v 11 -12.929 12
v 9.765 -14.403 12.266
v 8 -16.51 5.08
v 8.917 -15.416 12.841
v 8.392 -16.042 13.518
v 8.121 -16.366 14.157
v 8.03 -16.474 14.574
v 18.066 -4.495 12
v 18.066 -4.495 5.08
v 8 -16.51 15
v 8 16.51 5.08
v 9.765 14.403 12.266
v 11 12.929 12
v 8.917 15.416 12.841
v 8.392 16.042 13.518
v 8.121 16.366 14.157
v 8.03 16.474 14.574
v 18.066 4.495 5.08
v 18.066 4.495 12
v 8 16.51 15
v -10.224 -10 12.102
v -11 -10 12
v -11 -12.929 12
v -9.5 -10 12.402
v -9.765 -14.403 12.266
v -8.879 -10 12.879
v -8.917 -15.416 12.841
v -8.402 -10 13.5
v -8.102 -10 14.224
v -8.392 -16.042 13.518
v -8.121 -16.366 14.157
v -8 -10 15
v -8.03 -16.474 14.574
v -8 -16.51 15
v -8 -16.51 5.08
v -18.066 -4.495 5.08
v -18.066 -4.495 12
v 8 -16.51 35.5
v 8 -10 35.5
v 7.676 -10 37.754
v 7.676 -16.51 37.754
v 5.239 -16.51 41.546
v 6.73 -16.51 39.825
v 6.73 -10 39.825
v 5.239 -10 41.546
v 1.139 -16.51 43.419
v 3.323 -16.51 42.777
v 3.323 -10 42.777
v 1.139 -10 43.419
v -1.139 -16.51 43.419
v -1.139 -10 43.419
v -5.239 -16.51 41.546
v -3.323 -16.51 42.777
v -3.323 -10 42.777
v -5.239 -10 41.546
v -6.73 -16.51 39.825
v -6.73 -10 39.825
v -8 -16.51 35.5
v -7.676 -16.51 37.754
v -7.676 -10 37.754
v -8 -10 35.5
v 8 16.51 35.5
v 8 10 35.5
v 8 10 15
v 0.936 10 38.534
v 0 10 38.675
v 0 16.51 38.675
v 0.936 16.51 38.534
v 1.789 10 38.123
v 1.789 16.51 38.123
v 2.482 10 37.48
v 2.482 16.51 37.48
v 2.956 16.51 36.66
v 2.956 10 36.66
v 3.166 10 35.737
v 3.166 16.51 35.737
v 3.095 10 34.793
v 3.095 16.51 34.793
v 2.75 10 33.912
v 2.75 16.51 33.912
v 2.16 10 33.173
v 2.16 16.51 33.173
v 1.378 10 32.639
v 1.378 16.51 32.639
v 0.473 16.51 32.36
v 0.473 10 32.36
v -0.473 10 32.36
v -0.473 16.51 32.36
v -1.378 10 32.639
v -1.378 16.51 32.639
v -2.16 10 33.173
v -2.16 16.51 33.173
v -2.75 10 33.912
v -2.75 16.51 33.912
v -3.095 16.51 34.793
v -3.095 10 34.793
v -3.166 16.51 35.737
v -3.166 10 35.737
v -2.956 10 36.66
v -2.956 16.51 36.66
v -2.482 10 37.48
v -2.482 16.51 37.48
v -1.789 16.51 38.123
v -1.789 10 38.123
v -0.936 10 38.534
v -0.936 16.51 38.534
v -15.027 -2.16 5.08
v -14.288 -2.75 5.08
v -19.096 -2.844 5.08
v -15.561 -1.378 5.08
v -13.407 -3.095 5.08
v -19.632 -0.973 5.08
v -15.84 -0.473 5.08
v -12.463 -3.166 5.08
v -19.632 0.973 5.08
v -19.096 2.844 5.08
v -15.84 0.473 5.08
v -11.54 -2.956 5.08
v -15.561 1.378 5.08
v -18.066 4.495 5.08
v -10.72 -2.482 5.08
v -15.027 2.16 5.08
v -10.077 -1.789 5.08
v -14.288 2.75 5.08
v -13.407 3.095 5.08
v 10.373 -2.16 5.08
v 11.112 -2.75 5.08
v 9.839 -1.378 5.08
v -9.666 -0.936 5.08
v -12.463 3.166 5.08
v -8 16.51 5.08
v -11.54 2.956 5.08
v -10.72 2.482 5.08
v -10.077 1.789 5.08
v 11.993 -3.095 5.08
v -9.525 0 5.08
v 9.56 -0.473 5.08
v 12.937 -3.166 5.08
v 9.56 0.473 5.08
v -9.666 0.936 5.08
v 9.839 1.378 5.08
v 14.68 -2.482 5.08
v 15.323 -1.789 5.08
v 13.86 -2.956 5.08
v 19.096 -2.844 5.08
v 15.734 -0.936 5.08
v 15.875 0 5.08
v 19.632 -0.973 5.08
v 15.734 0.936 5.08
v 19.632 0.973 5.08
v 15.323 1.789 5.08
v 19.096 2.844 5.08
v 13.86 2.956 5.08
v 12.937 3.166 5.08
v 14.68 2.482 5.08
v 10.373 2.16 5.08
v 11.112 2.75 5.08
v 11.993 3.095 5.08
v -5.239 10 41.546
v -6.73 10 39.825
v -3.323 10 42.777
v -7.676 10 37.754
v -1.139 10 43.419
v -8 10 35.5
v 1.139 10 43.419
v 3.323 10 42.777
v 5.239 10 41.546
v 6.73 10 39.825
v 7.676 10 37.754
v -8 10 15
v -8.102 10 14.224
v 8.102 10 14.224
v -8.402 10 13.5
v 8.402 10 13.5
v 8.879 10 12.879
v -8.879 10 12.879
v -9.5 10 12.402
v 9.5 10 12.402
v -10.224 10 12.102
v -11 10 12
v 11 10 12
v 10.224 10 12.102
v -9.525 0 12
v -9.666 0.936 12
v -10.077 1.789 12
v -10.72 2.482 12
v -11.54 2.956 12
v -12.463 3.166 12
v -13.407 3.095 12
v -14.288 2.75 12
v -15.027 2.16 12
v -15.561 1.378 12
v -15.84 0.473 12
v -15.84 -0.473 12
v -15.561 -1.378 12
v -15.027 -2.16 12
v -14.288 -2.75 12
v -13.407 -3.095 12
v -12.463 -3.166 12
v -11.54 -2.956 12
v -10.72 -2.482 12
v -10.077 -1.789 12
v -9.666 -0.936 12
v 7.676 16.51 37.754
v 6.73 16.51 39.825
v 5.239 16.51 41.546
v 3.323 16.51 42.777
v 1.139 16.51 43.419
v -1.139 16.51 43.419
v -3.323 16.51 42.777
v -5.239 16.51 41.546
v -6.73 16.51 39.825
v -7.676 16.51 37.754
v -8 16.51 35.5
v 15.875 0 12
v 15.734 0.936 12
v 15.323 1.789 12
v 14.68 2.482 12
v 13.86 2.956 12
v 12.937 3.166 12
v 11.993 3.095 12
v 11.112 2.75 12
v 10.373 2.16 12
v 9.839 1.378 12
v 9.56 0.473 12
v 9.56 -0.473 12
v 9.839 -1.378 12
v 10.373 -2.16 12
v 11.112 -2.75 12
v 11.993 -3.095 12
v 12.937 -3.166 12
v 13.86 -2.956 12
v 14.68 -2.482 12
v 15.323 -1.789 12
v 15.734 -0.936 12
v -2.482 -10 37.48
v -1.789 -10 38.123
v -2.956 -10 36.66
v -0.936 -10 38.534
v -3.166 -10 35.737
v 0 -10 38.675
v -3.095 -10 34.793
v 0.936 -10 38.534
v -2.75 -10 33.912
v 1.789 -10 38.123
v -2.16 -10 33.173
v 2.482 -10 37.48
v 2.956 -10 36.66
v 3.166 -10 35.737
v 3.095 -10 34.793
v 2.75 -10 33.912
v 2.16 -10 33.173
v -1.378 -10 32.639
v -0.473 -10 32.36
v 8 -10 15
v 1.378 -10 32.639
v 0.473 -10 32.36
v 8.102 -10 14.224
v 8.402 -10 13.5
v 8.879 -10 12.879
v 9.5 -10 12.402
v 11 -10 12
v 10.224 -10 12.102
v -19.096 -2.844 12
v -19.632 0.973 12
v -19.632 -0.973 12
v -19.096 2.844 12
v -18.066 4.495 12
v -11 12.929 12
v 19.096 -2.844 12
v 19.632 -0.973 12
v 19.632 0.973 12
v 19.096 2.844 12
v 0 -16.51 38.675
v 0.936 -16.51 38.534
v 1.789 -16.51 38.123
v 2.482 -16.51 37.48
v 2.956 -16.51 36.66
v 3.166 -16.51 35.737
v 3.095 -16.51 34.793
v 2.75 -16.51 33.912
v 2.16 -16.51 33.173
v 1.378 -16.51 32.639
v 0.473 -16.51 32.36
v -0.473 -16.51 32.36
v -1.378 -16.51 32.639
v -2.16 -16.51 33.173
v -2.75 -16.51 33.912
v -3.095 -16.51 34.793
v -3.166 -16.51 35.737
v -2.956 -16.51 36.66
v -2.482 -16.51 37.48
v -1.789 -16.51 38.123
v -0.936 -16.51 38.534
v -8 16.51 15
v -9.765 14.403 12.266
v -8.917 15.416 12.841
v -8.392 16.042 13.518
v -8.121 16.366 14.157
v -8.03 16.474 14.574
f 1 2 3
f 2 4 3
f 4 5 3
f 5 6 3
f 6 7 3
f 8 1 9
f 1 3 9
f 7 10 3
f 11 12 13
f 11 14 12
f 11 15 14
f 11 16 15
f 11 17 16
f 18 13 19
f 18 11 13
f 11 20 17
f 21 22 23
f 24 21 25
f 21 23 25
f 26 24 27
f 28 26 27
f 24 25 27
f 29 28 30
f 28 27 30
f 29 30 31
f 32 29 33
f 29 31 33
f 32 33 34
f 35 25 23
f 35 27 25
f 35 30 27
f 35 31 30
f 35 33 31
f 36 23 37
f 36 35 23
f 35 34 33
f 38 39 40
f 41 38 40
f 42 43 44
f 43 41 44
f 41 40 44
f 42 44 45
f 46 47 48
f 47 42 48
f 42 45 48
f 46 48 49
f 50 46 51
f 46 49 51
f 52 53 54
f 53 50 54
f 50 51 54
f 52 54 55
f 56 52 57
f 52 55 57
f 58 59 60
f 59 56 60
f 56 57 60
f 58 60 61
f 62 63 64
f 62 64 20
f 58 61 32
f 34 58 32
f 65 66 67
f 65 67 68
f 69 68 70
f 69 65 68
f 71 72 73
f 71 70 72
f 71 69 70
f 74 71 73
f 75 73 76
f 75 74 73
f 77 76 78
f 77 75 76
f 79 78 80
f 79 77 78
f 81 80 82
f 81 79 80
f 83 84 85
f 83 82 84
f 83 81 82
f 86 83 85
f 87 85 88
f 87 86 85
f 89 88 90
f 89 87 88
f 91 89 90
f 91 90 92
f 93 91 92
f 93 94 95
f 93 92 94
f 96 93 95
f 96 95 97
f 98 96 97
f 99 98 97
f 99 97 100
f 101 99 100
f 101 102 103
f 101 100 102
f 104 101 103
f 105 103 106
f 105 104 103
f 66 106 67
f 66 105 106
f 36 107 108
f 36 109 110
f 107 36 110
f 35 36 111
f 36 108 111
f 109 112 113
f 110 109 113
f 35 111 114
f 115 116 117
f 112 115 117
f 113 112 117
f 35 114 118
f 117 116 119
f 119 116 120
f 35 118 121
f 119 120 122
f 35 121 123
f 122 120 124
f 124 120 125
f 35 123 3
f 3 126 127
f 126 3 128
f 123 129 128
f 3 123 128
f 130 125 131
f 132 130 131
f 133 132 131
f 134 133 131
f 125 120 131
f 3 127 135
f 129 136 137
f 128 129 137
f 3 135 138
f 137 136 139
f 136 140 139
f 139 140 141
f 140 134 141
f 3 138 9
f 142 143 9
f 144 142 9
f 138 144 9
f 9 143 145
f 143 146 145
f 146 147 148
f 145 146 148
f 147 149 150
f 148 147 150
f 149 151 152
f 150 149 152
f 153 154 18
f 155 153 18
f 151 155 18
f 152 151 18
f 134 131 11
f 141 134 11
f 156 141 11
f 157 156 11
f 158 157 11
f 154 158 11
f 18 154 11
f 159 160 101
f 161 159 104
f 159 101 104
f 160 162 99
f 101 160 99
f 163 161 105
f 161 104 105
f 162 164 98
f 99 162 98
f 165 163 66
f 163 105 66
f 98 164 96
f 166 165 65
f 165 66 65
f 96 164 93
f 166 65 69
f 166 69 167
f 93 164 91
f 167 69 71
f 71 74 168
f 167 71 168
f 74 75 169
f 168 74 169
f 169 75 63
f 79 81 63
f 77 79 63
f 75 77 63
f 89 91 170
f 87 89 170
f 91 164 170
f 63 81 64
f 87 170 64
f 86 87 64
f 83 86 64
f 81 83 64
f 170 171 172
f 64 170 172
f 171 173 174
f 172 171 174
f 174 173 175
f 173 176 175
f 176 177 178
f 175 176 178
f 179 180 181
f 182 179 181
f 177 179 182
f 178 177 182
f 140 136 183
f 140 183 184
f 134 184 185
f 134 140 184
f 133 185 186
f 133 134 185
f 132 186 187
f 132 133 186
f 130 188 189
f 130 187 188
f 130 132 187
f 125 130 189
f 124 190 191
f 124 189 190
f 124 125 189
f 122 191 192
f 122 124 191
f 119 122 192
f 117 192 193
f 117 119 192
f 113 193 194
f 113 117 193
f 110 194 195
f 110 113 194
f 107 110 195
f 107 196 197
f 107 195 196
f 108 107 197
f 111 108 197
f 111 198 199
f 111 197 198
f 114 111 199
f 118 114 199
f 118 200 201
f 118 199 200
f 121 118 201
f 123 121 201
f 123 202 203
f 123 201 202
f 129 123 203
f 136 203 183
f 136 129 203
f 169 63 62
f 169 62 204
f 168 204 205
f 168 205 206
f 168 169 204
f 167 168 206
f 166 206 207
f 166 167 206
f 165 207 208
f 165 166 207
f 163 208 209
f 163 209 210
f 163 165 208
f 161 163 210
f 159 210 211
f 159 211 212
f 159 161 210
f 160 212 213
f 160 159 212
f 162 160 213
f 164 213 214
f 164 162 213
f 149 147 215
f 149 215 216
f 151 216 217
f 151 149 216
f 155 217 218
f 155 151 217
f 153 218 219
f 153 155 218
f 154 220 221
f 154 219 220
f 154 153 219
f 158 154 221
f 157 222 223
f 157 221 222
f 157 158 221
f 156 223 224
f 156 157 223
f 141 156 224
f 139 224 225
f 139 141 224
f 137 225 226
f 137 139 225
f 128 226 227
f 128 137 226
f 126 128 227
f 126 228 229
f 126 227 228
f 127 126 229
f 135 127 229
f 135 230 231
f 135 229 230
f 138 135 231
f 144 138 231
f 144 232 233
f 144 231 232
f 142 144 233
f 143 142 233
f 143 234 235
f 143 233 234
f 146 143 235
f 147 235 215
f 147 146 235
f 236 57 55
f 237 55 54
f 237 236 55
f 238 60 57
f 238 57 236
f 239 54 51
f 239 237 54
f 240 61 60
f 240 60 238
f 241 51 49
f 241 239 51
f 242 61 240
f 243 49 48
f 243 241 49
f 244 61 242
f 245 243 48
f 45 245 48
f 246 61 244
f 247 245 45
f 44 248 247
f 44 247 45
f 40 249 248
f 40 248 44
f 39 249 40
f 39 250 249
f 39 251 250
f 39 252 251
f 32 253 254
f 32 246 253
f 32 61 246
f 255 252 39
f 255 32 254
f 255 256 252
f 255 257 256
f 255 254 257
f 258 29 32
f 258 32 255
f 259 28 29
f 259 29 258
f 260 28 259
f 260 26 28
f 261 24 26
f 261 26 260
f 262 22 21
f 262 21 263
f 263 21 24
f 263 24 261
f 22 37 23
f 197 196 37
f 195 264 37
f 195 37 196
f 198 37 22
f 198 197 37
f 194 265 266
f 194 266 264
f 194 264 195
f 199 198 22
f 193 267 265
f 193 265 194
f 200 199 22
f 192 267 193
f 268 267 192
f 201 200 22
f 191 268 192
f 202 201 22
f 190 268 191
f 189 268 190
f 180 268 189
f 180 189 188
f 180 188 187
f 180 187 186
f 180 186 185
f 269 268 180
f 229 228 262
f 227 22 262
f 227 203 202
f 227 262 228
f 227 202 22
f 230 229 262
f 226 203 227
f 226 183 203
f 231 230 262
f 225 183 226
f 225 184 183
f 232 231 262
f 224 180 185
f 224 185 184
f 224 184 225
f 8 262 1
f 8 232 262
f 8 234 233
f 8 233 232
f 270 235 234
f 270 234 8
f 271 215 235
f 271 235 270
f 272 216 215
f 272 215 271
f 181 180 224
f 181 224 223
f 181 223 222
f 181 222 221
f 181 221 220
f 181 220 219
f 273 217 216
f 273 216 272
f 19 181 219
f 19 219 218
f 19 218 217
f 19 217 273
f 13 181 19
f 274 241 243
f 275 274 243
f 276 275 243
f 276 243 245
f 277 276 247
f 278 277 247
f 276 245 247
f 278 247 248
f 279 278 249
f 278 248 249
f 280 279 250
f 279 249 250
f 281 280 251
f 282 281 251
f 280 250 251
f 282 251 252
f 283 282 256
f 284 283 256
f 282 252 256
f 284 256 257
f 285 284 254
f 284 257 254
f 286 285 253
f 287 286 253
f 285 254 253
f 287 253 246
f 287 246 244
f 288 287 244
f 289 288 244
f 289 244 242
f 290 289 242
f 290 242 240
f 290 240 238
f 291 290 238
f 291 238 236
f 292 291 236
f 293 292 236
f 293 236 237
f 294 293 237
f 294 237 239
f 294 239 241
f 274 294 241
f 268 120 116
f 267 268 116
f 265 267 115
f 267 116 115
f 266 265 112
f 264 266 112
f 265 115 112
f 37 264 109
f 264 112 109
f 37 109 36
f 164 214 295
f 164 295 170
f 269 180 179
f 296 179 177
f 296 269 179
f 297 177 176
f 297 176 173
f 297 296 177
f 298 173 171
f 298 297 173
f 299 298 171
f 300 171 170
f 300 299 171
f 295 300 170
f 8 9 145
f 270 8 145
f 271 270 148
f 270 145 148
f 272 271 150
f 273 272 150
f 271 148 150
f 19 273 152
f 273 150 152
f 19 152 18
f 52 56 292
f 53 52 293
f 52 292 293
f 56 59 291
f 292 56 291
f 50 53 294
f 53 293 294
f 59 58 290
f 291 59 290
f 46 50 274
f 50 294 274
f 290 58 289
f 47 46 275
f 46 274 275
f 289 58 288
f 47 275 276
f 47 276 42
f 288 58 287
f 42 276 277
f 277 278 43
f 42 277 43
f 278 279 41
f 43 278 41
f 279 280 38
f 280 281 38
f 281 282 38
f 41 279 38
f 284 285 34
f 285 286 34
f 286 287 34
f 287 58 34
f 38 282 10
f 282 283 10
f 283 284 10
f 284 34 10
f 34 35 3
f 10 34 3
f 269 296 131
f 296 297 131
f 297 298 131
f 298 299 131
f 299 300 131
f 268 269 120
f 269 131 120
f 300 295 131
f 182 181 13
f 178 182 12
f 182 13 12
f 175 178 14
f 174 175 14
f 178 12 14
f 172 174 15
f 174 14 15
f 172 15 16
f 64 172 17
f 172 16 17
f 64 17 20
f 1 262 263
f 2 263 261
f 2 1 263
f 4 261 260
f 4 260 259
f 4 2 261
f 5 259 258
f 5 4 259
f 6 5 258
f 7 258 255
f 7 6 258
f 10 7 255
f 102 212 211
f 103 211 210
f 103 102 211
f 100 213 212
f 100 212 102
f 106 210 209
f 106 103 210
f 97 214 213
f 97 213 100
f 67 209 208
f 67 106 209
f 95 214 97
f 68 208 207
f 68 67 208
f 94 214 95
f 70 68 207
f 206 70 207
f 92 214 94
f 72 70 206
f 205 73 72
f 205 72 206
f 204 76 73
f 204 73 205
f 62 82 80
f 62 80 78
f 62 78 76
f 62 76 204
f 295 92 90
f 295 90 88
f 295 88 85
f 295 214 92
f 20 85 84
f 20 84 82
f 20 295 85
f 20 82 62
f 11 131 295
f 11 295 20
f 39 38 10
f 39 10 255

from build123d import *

# Parameters (mm, degrees)
SKETCH1_W                      = 41.4
SKETCH1_H                      = 33.02
SKETCH1_R                      = 3.175
BOSS_EXTRUDE1_DEPTH            = 12
SKETCH2_W                      = 41.4
SKETCH2_H                      = 6.51
BOSS_EXTRUDE2_DEPTH            = 53
CUT_EXTRUDE1_REACH             = 72.186
SKETCH4_R                      = 3.175
CUT_EXTRUDE1_DIRECTION_2_REACH = 72.186
CUT_EXTRUDE3_REACH             = 72.186
CUT_EXTRUDE3_DIRECTION_2_REACH = 72.186
CUT_EXTRUDE4_DEPTH             = 12
BOSS_EXTRUDE3_DEPTH            = 12
FILLET3_R                      = 3
CUT_EXTRUDE5_DEPTH             = 5.08


with BuildPart() as part:
    # Sketch1 → Boss-Extrude1 (new body)
    with BuildSketch(Plane.XY):
        Rectangle(SKETCH1_W, SKETCH1_H)
        with Locations((12.7, 0)):
            Circle(SKETCH1_R, mode=Mode.SUBTRACT)
        with Locations((-12.7, 0)):
            Circle(SKETCH1_R, mode=Mode.SUBTRACT)
    extrude(amount=BOSS_EXTRUDE1_DEPTH)

    # Sketch2 → Boss-Extrude2 (add)
    with BuildSketch(Plane.XY.offset(12)):
        with Locations((0, 13.255)):
            Rectangle(SKETCH2_W, SKETCH2_H)
        with Locations((0, -13.255)):
            Rectangle(SKETCH2_W, SKETCH2_H)
    extrude(amount=BOSS_EXTRUDE2_DEPTH)

    # Cut-Extrude1: up to this face of the body (flat: up to its plane)
    cut_extrude1_end = Plane(part.part.faces().sort_by_distance((0, -16.51, 32.5))[0])
    # Sketch4 → Cut-Extrude1 (cut, up to the picked face)
    with BuildSketch(Plane(origin=(0, 0, 0), x_dir=(1, 0, 0), z_dir=(0, 1, 0)), mode=Mode.PRIVATE) as cut_extrude1_sk1:
        with Locations(Location((0, -35.5, 0), (0, 0, 270))):
            Circle(SKETCH4_R)
    cut_extrude1_tool1 = split(extrude(cut_extrude1_sk1.sketch, amount=-CUT_EXTRUDE1_REACH, mode=Mode.PRIVATE), bisect_by=cut_extrude1_end, keep=Keep.BOTH, mode=Mode.PRIVATE)
    add(cut_extrude1_tool1.solids().sort_by(Axis((0, 0, 35.5), (0, -1, 0)))[0], mode=Mode.SUBTRACT)

    # Cut-Extrude1 direction 2: up to this face of the body (flat: up to its plane)
    cut_extrude1_direction_2_end = Plane(part.part.faces().sort_by_distance((0, 16.51, 32.5))[0])
    # Sketch4 → Cut-Extrude1 direction 2 (cut, up to the picked face)
    with BuildSketch(Plane(origin=(0, 0, 0), x_dir=(1, 0, 0), z_dir=(0, 1, 0)), mode=Mode.PRIVATE) as cut_extrude1_direction_2_sk1:
        with Locations(Location((0, -35.5, 0), (0, 0, 270))):
            Circle(SKETCH4_R)
    cut_extrude1_direction_2_tool1 = split(extrude(cut_extrude1_direction_2_sk1.sketch, amount=CUT_EXTRUDE1_DIRECTION_2_REACH, mode=Mode.PRIVATE), bisect_by=cut_extrude1_direction_2_end, keep=Keep.BOTH, mode=Mode.PRIVATE)
    add(cut_extrude1_direction_2_tool1.solids().sort_by(Axis((0, 0, 35.5), (0, 1, 0)))[0], mode=Mode.SUBTRACT)

    # Cut-Extrude3: up to this face of the body (flat: up to its plane)
    cut_extrude3_end = Plane(part.part.faces().sort_by_distance((-19.929353518, -16.51, 32.5))[0])
    # Sketch6 → Cut-Extrude3 (cut, up to the picked face)
    with BuildSketch(Plane(origin=(0, 0, 0), x_dir=(1, 0, 0), z_dir=(0, 1, 0)), mode=Mode.PRIVATE) as cut_extrude3_sk1:
        with BuildLine():
            Line((-8, -35.5), (-8, -20))
            Line((-8, -20), (-8, -12))
            Line((-8, -12), (-16, -12))
            Line((-16, -12), (-20.7, -12))
            Line((-20.7, -12), (-20.7, -65))
            Line((-20.7, -65), (20.7, -65))
            Line((20.7, -65), (20.7, -12))
            Line((20.7, -12), (16, -12))
            Line((16, -12), (8, -12))
            Line((8, -12), (8, -20))
            Line((8, -20), (8, -35.5))
            ThreePointArc((8, -35.5), (0, -43.5), (-8, -35.5))
        make_face()
    cut_extrude3_tool1 = split(extrude(cut_extrude3_sk1.sketch, amount=-CUT_EXTRUDE3_REACH, mode=Mode.PRIVATE), bisect_by=cut_extrude3_end, keep=Keep.BOTH, mode=Mode.PRIVATE)
    add(cut_extrude3_tool1.solids().sort_by(Axis((-8.67253, 0, 27.75), (0, -1, 0)))[0], mode=Mode.SUBTRACT)

    # Cut-Extrude3 direction 2: up to this face of the body (flat: up to its plane)
    cut_extrude3_direction_2_end = Plane(part.part.faces().sort_by_distance((19.929353518, 16.51, 32.5))[0])
    # Sketch6 → Cut-Extrude3 direction 2 (cut, up to the picked face)
    with BuildSketch(Plane(origin=(0, 0, 0), x_dir=(1, 0, 0), z_dir=(0, 1, 0)), mode=Mode.PRIVATE) as cut_extrude3_direction_2_sk1:
        with BuildLine():
            Line((-8, -35.5), (-8, -20))
            Line((-8, -20), (-8, -12))
            Line((-8, -12), (-16, -12))
            Line((-16, -12), (-20.7, -12))
            Line((-20.7, -12), (-20.7, -65))
            Line((-20.7, -65), (20.7, -65))
            Line((20.7, -65), (20.7, -12))
            Line((20.7, -12), (16, -12))
            Line((16, -12), (8, -12))
            Line((8, -12), (8, -20))
            Line((8, -20), (8, -35.5))
            ThreePointArc((8, -35.5), (0, -43.5), (-8, -35.5))
        make_face()
    cut_extrude3_direction_2_tool1 = split(extrude(cut_extrude3_direction_2_sk1.sketch, amount=CUT_EXTRUDE3_DIRECTION_2_REACH, mode=Mode.PRIVATE), bisect_by=cut_extrude3_direction_2_end, keep=Keep.BOTH, mode=Mode.PRIVATE)
    add(cut_extrude3_direction_2_tool1.solids().sort_by(Axis((-8.67253, 0, 27.75), (0, 1, 0)))[0], mode=Mode.SUBTRACT)

    # Sketch7 → Cut-Extrude4 (cut)
    with BuildSketch(Plane.XY):
        with BuildLine():
            ThreePointArc((-12.7, 7), (-19.7, 0), (-12.7, -7))
            Line((-12.7, -7), (-8, -7))
            Line((-8, -7), (-8, -16.51))
            Line((-8, -16.51), (-20.7, -16.51))
            Line((-20.7, -16.51), (-20.7, 16.51))
            Line((-20.7, 16.51), (-8, 16.51))
            Line((-8, 16.51), (-8, 7))
            Line((-8, 7), (-12.7, 7))
        make_face()
        with BuildLine():
            Line((12.7, 7), (8, 7))
            Line((8, 7), (8, 16.51))
            Line((8, 16.51), (20.7, 16.51))
            Line((20.7, 16.51), (20.7, -16.51))
            Line((20.7, -16.51), (8, -16.51))
            Line((8, -16.51), (8, -7))
            Line((8, -7), (12.7, -7))
            ThreePointArc((12.7, -7), (19.7, 0), (12.7, 7))
        make_face()
    extrude(amount=CUT_EXTRUDE4_DEPTH, mode=Mode.SUBTRACT)

    # Sketch8 → Boss-Extrude3 (add)
    with BuildSketch(Plane.XY):
        with BuildLine():
            Line((8, -16.51), (18.065759147, -4.495400847))
            ThreePointArc((18.065759147, -4.495400847), (15.660759537, -6.343020019), (12.7, -7))
            Line((12.7, -7), (8, -7))
            Line((8, -7), (8, -16.51))
        make_face()
        with BuildLine():
            ThreePointArc((-18.065759147, -4.495400847), (-15.660759537, -6.343020019), (-12.7, -7))
            Line((-12.7, -7), (-8, -7))
            Line((-8, -7), (-8, -16.51))
            Line((-8, -16.51), (-18.065759147, -4.495400847))
        make_face()
        with BuildLine():
            Line((8, 16.51), (18.065759147, 4.495400847))
            ThreePointArc((18.065759147, 4.495400847), (15.660759537, 6.343020019), (12.7, 7))
            Line((12.7, 7), (8, 7))
            Line((8, 7), (8, 16.51))
        make_face()
        with BuildLine():
            Line((-8, 16.51), (-18.065759147, 4.495400847))
            ThreePointArc((-18.065759147, 4.495400847), (-15.660759537, 6.343020019), (-12.7, 7))
            Line((-12.7, 7), (-8, 7))
            Line((-8, 7), (-8, 16.51))
        make_face()
    extrude(amount=BOSS_EXTRUDE3_DEPTH)

    # Fillet3
    fillet3_edges = [part.edges().sort_by_distance(p)[0] for p in [
        (8, -13.255, 12),
        (-8, -13.255, 12),
        (8, 13.255, 12),
        (-8, 13.255, 12),
    ]]
    fillet(fillet3_edges, radius=FILLET3_R)

    # Sketch10 → Cut-Extrude5 (cut)
    with BuildSketch(Plane.XY):
        with BuildLine():
            Line((-8, 16.51), (-18.065759147, 4.495400847))
            ThreePointArc((-18.065759147, 4.495400847), (-19.7, 0), (-18.065759147, -4.495400847))
            Line((-18.065759147, -4.495400847), (-8, -16.51))
            Line((-8, -16.51), (8, -16.51))
            Line((8, -16.51), (18.065759147, -4.495400847))
            ThreePointArc((18.065759147, -4.495400847), (19.7, 0), (18.065759147, 4.495400847))
            Line((18.065759147, 4.495400847), (8, 16.51))
            Line((8, 16.51), (-8, 16.51))
        make_face()
    extrude(amount=CUT_EXTRUDE5_DEPTH, mode=Mode.SUBTRACT)


solid = part.part
